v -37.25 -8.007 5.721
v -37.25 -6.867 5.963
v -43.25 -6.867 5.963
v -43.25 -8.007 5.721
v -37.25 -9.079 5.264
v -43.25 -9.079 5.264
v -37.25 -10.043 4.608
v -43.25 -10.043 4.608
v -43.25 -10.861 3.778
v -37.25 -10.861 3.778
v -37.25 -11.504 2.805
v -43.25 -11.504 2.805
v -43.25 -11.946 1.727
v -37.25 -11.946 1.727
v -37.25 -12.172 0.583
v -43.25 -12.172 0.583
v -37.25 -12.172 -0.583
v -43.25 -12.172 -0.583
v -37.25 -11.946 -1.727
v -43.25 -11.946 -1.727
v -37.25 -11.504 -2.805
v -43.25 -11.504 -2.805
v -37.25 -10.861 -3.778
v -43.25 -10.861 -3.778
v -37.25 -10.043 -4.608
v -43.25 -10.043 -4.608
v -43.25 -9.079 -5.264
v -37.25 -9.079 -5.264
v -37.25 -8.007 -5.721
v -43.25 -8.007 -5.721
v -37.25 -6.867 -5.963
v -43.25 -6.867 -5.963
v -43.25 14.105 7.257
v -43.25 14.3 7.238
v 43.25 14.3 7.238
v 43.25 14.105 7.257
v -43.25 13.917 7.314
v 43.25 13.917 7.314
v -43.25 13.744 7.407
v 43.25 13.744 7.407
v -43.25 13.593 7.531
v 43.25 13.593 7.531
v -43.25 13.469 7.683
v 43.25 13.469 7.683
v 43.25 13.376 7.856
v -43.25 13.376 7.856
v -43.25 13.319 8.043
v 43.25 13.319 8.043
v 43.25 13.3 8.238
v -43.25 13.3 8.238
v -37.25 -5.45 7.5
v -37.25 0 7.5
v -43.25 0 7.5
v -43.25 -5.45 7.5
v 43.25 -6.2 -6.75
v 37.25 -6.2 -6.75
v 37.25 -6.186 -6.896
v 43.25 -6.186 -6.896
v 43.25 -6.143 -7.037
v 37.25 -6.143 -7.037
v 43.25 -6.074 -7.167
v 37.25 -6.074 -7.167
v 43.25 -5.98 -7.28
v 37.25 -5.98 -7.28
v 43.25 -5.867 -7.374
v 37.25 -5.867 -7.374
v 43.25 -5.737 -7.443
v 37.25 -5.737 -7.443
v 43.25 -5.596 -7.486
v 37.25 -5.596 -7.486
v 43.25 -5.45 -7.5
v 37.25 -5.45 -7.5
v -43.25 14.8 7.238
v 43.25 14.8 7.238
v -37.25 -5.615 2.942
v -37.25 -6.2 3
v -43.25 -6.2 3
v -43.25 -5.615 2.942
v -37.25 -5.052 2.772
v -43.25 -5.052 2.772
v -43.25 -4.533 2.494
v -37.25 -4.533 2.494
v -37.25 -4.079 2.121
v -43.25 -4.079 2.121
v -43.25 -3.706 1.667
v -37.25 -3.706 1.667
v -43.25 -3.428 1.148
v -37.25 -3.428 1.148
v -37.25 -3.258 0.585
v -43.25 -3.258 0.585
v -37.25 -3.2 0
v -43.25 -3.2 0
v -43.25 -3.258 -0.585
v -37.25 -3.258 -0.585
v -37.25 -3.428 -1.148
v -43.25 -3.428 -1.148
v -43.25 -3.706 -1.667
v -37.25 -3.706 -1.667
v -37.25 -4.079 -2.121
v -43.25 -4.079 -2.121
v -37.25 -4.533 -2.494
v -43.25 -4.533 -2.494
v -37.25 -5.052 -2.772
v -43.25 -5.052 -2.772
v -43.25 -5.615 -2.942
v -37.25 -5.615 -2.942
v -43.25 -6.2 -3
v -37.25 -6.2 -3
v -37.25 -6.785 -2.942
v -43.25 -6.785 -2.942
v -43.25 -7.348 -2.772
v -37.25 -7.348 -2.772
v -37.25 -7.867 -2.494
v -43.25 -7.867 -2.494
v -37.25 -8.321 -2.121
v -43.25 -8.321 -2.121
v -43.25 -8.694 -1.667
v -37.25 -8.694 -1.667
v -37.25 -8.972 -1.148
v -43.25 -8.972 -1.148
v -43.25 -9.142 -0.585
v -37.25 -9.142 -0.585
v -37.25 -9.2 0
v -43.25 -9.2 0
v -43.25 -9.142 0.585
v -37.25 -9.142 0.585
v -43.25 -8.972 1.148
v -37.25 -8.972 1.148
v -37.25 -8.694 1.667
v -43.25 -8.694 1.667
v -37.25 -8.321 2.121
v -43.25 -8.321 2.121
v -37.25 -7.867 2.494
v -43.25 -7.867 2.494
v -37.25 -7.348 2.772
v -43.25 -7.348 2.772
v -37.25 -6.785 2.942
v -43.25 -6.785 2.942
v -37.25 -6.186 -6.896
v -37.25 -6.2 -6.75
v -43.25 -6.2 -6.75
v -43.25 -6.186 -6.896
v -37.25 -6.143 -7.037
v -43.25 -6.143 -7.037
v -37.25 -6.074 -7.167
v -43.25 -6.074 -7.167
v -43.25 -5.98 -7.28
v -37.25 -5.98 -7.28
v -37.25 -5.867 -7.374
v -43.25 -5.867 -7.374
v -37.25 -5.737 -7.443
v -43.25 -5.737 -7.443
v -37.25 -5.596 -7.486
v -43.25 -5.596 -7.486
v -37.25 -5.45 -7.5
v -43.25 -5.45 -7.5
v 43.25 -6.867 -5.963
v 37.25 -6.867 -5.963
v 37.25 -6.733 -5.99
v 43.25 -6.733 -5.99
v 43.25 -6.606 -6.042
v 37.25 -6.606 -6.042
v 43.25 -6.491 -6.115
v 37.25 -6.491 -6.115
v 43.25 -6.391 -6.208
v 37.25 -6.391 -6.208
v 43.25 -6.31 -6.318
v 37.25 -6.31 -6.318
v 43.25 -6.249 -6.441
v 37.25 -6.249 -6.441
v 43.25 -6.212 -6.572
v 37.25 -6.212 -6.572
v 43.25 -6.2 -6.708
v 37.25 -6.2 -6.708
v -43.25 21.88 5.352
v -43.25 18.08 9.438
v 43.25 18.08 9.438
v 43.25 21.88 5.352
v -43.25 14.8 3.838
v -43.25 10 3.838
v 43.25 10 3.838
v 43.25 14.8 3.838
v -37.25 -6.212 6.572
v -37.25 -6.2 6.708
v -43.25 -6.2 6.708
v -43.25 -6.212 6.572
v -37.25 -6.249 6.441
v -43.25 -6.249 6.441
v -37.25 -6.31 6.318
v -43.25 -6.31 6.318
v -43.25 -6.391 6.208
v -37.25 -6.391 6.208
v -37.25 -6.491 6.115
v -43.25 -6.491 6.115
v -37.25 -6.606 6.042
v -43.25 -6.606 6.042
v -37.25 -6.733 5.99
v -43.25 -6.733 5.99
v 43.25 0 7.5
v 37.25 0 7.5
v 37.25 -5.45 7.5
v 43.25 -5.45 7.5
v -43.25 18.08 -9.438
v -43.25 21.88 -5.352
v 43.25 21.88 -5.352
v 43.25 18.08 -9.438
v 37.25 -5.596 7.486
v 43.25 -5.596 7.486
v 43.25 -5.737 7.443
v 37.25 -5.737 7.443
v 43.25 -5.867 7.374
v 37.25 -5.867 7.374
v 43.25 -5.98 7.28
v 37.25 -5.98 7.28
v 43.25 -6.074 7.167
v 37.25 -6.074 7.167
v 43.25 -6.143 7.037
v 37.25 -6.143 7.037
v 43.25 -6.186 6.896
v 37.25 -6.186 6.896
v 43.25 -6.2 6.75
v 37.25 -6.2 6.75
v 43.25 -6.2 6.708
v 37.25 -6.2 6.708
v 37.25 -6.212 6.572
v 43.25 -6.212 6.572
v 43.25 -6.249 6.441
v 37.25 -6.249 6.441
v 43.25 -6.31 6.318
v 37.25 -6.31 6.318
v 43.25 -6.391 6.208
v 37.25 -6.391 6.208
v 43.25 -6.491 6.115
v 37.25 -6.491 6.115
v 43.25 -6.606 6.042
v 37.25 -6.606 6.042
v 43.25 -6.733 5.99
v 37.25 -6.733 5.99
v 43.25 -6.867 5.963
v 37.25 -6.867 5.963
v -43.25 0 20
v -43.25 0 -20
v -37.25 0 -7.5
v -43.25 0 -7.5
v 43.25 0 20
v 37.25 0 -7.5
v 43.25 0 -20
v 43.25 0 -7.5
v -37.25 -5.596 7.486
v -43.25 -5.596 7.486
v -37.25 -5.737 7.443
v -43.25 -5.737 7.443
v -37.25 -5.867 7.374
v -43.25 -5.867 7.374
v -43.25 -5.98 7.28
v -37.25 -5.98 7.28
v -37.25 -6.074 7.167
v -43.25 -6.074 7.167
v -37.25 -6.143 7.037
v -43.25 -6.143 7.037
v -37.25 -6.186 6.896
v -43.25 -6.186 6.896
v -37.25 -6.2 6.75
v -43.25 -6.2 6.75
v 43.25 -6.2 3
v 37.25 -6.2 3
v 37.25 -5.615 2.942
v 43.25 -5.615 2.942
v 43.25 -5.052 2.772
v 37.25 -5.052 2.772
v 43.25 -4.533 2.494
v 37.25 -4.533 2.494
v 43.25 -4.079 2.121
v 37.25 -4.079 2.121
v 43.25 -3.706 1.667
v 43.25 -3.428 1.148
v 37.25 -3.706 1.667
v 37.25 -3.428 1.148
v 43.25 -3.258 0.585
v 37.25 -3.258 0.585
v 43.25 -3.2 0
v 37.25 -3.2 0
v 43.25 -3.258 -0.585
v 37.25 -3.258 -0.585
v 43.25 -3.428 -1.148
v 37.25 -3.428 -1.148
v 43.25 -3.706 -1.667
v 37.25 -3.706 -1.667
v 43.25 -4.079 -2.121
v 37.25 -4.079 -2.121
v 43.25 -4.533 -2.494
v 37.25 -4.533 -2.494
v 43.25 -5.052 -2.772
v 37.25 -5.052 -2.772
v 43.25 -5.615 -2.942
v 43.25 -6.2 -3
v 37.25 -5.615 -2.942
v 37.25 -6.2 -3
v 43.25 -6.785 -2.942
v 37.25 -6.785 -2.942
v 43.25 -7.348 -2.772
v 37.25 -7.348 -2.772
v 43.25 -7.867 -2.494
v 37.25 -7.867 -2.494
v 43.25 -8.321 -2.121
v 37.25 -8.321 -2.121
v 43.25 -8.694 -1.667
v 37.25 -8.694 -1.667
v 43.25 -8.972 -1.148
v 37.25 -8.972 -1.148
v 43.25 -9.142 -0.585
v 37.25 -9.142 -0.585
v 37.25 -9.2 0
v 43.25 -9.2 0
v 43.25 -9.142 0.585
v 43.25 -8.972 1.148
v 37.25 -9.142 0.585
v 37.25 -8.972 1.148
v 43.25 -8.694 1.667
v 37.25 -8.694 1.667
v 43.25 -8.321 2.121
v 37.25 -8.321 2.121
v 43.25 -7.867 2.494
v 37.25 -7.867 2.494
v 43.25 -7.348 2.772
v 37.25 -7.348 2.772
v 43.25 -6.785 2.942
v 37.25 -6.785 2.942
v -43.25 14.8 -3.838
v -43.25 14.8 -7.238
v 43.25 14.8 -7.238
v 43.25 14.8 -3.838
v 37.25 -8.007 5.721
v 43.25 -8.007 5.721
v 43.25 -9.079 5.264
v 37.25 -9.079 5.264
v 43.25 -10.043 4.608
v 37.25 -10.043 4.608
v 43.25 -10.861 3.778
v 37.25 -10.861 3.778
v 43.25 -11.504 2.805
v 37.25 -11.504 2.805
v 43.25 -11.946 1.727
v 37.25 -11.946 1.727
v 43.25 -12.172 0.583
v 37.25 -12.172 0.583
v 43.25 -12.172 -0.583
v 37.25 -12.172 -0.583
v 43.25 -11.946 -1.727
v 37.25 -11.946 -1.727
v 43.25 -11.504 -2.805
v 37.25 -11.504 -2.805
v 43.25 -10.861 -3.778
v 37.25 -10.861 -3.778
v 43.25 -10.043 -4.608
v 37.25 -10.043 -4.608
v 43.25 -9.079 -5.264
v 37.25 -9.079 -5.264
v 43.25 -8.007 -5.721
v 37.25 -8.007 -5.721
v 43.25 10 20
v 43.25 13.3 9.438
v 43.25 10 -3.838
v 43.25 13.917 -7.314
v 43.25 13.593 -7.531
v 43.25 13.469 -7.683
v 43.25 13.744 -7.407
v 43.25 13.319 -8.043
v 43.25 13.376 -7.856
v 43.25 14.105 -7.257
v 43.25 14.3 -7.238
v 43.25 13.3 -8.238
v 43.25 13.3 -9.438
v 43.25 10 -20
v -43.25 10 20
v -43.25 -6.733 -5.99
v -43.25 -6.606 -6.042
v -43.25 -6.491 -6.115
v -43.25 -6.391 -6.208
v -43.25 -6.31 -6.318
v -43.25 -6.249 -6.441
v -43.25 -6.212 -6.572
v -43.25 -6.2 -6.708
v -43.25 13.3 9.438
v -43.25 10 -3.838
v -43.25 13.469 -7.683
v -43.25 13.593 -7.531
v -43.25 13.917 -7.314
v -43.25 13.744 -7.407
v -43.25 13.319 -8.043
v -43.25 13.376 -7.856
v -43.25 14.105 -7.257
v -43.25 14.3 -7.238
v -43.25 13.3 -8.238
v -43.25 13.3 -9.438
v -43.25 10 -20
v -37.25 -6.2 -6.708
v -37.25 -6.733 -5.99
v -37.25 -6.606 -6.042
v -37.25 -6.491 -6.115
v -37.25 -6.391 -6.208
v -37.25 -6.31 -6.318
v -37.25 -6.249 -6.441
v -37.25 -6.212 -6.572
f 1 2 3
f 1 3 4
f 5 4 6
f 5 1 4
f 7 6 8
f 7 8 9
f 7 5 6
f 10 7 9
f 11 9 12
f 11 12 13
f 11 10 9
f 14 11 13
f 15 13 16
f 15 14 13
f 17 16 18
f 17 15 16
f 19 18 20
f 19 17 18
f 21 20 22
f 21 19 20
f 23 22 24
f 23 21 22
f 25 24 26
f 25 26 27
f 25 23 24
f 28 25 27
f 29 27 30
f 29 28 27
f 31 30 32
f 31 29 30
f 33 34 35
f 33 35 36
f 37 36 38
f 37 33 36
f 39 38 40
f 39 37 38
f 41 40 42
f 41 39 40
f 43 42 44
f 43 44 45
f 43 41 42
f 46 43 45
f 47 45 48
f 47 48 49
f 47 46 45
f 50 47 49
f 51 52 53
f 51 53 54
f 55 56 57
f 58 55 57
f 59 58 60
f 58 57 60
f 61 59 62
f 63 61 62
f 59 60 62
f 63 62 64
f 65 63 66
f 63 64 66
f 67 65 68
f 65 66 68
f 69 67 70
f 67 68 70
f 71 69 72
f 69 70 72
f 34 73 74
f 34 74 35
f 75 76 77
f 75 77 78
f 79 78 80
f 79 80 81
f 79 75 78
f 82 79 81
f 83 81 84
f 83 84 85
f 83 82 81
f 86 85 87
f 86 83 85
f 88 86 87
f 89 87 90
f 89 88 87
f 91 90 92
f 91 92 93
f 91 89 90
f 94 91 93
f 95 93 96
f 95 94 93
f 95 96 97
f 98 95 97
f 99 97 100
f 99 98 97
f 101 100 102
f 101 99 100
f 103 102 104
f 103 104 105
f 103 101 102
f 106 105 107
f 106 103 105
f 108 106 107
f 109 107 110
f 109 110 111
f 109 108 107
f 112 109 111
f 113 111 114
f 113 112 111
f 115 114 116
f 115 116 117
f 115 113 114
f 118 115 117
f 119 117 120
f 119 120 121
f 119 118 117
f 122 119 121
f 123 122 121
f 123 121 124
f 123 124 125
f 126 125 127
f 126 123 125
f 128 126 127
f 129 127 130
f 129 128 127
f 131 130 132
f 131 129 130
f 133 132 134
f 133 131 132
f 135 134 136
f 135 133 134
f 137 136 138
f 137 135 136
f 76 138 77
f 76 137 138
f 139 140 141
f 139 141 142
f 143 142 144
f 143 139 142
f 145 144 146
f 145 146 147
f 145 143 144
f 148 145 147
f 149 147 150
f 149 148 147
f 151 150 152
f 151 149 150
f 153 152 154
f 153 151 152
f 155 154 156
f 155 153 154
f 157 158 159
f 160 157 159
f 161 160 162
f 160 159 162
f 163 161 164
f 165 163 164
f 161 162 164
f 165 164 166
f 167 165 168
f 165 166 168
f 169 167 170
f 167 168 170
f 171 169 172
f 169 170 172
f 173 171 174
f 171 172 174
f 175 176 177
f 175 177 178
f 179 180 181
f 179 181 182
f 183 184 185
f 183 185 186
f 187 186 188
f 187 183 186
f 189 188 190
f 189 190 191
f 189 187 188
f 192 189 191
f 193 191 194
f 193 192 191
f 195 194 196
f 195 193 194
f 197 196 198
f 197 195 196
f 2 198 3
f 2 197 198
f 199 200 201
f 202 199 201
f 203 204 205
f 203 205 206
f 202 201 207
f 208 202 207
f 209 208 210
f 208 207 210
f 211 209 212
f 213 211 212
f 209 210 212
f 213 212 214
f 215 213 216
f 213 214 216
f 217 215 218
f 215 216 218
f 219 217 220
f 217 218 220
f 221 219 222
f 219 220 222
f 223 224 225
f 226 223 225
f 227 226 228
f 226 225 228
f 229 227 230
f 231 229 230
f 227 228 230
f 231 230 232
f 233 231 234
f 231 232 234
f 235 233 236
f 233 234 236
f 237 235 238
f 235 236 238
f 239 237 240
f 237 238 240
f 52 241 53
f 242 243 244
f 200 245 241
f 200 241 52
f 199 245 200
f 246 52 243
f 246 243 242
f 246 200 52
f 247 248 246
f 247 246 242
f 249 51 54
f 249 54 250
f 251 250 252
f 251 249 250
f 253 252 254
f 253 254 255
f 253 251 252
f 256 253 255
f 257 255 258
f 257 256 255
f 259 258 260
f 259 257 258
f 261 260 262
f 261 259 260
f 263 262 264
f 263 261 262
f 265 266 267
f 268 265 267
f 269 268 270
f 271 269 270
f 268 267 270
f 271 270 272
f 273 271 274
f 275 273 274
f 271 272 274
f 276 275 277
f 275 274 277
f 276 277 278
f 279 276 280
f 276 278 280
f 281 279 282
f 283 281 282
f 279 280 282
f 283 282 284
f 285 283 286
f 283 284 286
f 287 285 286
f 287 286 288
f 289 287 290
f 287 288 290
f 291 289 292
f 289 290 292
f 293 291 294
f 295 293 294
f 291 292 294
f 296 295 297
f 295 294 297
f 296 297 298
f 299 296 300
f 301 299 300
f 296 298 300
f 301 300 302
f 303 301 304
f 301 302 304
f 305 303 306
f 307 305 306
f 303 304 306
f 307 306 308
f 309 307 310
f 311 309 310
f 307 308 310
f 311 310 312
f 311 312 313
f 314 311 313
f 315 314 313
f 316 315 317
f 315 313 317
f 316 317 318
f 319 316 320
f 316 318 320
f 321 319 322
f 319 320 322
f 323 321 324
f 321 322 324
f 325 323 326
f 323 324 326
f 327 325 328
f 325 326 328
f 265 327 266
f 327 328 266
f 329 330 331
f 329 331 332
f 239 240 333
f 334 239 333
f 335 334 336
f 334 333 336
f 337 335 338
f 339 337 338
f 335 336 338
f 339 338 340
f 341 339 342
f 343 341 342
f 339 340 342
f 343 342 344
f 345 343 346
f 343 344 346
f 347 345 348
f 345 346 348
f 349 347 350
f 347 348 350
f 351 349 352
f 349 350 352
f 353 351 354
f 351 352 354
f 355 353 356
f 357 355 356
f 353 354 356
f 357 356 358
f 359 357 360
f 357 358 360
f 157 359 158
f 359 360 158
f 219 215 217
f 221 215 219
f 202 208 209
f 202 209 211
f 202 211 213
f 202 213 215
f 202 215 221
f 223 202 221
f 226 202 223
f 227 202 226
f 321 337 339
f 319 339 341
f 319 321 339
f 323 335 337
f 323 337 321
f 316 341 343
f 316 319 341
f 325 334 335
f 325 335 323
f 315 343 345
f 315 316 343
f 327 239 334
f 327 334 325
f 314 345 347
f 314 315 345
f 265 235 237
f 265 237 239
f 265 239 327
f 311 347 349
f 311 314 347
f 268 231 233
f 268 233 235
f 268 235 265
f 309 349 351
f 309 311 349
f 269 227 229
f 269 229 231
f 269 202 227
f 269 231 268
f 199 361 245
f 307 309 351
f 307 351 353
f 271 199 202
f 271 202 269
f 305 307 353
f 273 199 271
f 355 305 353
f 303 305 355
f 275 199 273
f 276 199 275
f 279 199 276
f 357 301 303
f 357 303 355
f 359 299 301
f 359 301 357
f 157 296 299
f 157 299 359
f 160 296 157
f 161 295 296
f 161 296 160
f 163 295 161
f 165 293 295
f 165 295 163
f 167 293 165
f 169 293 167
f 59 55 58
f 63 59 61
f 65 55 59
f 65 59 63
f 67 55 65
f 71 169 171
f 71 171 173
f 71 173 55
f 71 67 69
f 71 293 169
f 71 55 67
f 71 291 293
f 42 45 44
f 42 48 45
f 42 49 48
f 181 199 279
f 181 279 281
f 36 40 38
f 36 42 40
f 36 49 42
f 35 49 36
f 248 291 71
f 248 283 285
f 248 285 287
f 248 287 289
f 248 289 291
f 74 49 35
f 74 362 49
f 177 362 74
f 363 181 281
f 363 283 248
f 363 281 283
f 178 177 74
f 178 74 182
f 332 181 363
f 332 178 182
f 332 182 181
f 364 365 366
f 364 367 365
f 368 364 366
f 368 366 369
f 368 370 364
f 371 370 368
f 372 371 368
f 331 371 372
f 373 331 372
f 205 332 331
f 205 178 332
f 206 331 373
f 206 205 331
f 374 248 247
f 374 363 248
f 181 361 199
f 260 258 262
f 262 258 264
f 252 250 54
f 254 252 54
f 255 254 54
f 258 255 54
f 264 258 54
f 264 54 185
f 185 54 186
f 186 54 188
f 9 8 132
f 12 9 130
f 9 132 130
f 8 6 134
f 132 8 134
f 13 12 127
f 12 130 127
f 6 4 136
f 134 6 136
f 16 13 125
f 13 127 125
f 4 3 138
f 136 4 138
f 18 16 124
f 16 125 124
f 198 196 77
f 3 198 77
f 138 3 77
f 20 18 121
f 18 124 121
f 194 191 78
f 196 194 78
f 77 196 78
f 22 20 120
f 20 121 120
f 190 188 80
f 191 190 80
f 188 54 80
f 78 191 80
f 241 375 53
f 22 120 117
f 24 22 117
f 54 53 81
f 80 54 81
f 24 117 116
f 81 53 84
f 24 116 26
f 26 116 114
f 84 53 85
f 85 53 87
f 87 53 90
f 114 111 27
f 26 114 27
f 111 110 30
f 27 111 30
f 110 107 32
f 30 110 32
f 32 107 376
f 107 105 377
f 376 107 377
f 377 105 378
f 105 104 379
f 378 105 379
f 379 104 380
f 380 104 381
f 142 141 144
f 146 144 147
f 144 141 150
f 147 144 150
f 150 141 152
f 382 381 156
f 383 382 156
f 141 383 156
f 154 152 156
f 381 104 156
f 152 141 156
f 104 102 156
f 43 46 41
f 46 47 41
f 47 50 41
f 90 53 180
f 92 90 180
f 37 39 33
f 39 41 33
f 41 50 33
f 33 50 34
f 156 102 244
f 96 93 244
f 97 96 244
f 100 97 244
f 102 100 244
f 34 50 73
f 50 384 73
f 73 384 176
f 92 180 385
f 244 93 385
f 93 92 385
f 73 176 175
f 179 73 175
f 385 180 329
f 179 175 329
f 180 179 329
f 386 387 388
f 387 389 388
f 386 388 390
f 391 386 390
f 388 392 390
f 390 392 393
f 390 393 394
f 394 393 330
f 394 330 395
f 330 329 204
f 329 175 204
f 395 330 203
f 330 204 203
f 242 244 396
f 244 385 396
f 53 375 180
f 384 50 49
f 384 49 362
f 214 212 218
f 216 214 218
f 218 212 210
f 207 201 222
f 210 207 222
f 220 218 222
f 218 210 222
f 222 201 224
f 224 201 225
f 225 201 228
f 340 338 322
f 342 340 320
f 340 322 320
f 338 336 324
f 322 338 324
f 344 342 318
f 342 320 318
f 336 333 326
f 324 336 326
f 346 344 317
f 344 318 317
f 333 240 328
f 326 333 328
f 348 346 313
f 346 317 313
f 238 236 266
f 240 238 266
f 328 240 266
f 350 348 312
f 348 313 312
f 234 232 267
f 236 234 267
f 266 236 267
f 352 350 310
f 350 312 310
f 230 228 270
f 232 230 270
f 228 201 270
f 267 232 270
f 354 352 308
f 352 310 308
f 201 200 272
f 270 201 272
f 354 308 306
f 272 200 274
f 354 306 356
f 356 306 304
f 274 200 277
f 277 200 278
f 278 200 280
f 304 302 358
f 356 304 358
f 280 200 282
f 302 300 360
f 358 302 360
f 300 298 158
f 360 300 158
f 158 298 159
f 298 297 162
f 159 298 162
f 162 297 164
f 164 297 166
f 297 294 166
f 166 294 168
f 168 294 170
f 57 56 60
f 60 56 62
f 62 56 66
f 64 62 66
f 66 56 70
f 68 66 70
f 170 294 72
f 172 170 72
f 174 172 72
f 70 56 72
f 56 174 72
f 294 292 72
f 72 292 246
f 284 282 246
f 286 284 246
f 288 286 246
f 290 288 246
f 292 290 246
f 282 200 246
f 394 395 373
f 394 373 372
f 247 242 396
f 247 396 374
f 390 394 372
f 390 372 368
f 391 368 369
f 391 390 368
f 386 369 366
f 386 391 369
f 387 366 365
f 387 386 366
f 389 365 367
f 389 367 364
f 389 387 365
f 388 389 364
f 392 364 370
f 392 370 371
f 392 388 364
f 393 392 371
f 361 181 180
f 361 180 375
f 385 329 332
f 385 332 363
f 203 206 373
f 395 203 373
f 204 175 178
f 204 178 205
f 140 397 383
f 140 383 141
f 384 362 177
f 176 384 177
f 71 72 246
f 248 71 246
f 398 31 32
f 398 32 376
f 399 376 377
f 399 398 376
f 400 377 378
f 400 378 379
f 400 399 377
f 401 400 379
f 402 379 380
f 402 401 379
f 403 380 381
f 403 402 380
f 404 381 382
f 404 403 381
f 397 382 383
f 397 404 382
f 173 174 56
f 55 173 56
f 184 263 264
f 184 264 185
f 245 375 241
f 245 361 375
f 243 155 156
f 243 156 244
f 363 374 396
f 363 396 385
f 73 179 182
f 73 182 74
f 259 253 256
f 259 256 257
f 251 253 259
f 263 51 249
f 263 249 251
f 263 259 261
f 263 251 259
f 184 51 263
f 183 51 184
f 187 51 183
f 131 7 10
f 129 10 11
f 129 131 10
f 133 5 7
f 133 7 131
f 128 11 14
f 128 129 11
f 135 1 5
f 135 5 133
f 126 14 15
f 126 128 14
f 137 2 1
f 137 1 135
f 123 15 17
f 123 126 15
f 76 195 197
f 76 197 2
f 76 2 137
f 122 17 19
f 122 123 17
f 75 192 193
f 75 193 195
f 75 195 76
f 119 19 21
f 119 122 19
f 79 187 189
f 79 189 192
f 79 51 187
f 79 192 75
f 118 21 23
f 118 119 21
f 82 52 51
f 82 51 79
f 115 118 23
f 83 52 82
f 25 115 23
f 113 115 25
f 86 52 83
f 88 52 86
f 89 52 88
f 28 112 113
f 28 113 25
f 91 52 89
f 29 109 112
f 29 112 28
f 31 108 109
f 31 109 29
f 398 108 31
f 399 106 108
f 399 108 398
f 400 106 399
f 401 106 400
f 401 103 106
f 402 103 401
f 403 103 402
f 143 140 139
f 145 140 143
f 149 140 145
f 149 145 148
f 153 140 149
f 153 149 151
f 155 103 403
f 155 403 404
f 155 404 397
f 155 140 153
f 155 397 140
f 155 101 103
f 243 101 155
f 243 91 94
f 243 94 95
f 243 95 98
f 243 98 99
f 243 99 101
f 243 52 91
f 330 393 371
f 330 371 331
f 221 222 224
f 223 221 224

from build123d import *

# Parameters (mm, degrees)
SKETCH1_W           = 74.5
SKETCH1_H           = 40
BOSS_EXTRUDE1_DEPTH = 10
BOSS_EXTRUDE2_DEPTH = 6
BOSS_EXTRUDE3_DEPTH = 86.5


with BuildPart() as part:
    # Sketch1 → Boss-Extrude1 (new body)
    with BuildSketch(Plane(origin=(0, 0, 0), x_dir=(1, 0, 0), z_dir=(0, 1, 0))):
        Rectangle(SKETCH1_W, SKETCH1_H)
    extrude(amount=BOSS_EXTRUDE1_DEPTH)

    # Sketch2 → Boss-Extrude2 (add)
    # profile 1 of 2: a face of its own
    with BuildSketch(Plane(origin=(37.25, 0, 0), x_dir=(0, 0, -1), z_dir=(1, 0, 0))):
        with BuildLine():
            Line((7.5, 0), (-7.5, 0))
            Line((-7.5, 0), (-7.5, -5.45))
            ThreePointArc((-7.5, -5.45), (-7.280330086, -5.980330086), (-6.75, -6.2))
            Line((-6.75, -6.2), (-6.708203932, -6.2))
            ThreePointArc((-6.708203932, -6.2), (-6.208203932, -6.390983006), (-5.96284794, -6.866666667))
            ThreePointArc((-5.96284794, -6.866666667), (0, -12.2), (5.96284794, -6.866666667))
            ThreePointArc((5.96284794, -6.866666667), (6.208203932, -6.390983006), (6.708203932, -6.2))
            Line((6.708203932, -6.2), (6.75, -6.2))
            ThreePointArc((6.75, -6.2), (7.280330086, -5.980330086), (7.5, -5.45))
            Line((7.5, -5.45), (7.5, 0))
        make_face()
        with BuildLine():
            ThreePointArc((3, -6.2), (0, -9.2), (-3, -6.2))
            ThreePointArc((-3, -6.2), (0, -3.2), (3, -6.2))
        make_face(mode=Mode.SUBTRACT)
    # profile 2 of 2: a face of its own
    with BuildSketch(Plane(origin=(37.25, 0, 0), x_dir=(0, 0, -1), z_dir=(1, 0, 0))):
        Polygon((-20, 0), (-7.5, 0), (7.5, 0), (20, 0), (20, 10), (-20, 10), align=None)
    boss_extrude2 = extrude(amount=BOSS_EXTRUDE2_DEPTH)

    # Mirror1: Boss-Extrude2 across plane
    add(boss_extrude2.mirror(Plane(origin=(0, 0, 0), x_dir=(0, 0, 1), z_dir=(1, 0, 0))))

    # Sketch3 → Boss-Extrude3 (add)
    with BuildSketch(Plane.ZY.offset(43.25)):
        with BuildLine():
            Line((-3.838227356, 14.8), (-3.838227356, 10))
            Line((-3.838227356, 10), (3.838227356, 10))
            Line((3.838227356, 10), (3.838227356, 14.8))
            Line((3.838227356, 14.8), (7.238227356, 14.8))
            Line((7.238227356, 14.8), (7.238227356, 14.3))
            ThreePointArc((7.238227356, 14.3), (7.531120575, 13.592893219), (8.238227356, 13.3))
            Line((8.238227356, 13.3), (9.438227356, 13.3))
            Line((9.438227356, 13.3), (9.438227356, 14.8))
            Line((9.438227356, 14.8), (9.438227356, 18.08))
            Line((9.438227356, 18.08), (5.3521045, 21.88))
            Line((5.3521045, 21.88), (-5.3521045, 21.88))
            Line((-5.3521045, 21.88), (-9.438227356, 18.08))
            Line((-9.438227356, 18.08), (-9.438227356, 14.8))
            Line((-9.438227356, 14.8), (-9.438227356, 13.3))
            Line((-9.438227356, 13.3), (-8.238227356, 13.3))
            ThreePointArc((-8.238227356, 13.3), (-7.531120575, 13.592893219), (-7.238227356, 14.3))
            Line((-7.238227356, 14.3), (-7.238227356, 14.8))
            Line((-7.238227356, 14.8), (-3.838227356, 14.8))
        make_face()
    extrude(amount=-BOSS_EXTRUDE3_DEPTH)


solid = part.part
